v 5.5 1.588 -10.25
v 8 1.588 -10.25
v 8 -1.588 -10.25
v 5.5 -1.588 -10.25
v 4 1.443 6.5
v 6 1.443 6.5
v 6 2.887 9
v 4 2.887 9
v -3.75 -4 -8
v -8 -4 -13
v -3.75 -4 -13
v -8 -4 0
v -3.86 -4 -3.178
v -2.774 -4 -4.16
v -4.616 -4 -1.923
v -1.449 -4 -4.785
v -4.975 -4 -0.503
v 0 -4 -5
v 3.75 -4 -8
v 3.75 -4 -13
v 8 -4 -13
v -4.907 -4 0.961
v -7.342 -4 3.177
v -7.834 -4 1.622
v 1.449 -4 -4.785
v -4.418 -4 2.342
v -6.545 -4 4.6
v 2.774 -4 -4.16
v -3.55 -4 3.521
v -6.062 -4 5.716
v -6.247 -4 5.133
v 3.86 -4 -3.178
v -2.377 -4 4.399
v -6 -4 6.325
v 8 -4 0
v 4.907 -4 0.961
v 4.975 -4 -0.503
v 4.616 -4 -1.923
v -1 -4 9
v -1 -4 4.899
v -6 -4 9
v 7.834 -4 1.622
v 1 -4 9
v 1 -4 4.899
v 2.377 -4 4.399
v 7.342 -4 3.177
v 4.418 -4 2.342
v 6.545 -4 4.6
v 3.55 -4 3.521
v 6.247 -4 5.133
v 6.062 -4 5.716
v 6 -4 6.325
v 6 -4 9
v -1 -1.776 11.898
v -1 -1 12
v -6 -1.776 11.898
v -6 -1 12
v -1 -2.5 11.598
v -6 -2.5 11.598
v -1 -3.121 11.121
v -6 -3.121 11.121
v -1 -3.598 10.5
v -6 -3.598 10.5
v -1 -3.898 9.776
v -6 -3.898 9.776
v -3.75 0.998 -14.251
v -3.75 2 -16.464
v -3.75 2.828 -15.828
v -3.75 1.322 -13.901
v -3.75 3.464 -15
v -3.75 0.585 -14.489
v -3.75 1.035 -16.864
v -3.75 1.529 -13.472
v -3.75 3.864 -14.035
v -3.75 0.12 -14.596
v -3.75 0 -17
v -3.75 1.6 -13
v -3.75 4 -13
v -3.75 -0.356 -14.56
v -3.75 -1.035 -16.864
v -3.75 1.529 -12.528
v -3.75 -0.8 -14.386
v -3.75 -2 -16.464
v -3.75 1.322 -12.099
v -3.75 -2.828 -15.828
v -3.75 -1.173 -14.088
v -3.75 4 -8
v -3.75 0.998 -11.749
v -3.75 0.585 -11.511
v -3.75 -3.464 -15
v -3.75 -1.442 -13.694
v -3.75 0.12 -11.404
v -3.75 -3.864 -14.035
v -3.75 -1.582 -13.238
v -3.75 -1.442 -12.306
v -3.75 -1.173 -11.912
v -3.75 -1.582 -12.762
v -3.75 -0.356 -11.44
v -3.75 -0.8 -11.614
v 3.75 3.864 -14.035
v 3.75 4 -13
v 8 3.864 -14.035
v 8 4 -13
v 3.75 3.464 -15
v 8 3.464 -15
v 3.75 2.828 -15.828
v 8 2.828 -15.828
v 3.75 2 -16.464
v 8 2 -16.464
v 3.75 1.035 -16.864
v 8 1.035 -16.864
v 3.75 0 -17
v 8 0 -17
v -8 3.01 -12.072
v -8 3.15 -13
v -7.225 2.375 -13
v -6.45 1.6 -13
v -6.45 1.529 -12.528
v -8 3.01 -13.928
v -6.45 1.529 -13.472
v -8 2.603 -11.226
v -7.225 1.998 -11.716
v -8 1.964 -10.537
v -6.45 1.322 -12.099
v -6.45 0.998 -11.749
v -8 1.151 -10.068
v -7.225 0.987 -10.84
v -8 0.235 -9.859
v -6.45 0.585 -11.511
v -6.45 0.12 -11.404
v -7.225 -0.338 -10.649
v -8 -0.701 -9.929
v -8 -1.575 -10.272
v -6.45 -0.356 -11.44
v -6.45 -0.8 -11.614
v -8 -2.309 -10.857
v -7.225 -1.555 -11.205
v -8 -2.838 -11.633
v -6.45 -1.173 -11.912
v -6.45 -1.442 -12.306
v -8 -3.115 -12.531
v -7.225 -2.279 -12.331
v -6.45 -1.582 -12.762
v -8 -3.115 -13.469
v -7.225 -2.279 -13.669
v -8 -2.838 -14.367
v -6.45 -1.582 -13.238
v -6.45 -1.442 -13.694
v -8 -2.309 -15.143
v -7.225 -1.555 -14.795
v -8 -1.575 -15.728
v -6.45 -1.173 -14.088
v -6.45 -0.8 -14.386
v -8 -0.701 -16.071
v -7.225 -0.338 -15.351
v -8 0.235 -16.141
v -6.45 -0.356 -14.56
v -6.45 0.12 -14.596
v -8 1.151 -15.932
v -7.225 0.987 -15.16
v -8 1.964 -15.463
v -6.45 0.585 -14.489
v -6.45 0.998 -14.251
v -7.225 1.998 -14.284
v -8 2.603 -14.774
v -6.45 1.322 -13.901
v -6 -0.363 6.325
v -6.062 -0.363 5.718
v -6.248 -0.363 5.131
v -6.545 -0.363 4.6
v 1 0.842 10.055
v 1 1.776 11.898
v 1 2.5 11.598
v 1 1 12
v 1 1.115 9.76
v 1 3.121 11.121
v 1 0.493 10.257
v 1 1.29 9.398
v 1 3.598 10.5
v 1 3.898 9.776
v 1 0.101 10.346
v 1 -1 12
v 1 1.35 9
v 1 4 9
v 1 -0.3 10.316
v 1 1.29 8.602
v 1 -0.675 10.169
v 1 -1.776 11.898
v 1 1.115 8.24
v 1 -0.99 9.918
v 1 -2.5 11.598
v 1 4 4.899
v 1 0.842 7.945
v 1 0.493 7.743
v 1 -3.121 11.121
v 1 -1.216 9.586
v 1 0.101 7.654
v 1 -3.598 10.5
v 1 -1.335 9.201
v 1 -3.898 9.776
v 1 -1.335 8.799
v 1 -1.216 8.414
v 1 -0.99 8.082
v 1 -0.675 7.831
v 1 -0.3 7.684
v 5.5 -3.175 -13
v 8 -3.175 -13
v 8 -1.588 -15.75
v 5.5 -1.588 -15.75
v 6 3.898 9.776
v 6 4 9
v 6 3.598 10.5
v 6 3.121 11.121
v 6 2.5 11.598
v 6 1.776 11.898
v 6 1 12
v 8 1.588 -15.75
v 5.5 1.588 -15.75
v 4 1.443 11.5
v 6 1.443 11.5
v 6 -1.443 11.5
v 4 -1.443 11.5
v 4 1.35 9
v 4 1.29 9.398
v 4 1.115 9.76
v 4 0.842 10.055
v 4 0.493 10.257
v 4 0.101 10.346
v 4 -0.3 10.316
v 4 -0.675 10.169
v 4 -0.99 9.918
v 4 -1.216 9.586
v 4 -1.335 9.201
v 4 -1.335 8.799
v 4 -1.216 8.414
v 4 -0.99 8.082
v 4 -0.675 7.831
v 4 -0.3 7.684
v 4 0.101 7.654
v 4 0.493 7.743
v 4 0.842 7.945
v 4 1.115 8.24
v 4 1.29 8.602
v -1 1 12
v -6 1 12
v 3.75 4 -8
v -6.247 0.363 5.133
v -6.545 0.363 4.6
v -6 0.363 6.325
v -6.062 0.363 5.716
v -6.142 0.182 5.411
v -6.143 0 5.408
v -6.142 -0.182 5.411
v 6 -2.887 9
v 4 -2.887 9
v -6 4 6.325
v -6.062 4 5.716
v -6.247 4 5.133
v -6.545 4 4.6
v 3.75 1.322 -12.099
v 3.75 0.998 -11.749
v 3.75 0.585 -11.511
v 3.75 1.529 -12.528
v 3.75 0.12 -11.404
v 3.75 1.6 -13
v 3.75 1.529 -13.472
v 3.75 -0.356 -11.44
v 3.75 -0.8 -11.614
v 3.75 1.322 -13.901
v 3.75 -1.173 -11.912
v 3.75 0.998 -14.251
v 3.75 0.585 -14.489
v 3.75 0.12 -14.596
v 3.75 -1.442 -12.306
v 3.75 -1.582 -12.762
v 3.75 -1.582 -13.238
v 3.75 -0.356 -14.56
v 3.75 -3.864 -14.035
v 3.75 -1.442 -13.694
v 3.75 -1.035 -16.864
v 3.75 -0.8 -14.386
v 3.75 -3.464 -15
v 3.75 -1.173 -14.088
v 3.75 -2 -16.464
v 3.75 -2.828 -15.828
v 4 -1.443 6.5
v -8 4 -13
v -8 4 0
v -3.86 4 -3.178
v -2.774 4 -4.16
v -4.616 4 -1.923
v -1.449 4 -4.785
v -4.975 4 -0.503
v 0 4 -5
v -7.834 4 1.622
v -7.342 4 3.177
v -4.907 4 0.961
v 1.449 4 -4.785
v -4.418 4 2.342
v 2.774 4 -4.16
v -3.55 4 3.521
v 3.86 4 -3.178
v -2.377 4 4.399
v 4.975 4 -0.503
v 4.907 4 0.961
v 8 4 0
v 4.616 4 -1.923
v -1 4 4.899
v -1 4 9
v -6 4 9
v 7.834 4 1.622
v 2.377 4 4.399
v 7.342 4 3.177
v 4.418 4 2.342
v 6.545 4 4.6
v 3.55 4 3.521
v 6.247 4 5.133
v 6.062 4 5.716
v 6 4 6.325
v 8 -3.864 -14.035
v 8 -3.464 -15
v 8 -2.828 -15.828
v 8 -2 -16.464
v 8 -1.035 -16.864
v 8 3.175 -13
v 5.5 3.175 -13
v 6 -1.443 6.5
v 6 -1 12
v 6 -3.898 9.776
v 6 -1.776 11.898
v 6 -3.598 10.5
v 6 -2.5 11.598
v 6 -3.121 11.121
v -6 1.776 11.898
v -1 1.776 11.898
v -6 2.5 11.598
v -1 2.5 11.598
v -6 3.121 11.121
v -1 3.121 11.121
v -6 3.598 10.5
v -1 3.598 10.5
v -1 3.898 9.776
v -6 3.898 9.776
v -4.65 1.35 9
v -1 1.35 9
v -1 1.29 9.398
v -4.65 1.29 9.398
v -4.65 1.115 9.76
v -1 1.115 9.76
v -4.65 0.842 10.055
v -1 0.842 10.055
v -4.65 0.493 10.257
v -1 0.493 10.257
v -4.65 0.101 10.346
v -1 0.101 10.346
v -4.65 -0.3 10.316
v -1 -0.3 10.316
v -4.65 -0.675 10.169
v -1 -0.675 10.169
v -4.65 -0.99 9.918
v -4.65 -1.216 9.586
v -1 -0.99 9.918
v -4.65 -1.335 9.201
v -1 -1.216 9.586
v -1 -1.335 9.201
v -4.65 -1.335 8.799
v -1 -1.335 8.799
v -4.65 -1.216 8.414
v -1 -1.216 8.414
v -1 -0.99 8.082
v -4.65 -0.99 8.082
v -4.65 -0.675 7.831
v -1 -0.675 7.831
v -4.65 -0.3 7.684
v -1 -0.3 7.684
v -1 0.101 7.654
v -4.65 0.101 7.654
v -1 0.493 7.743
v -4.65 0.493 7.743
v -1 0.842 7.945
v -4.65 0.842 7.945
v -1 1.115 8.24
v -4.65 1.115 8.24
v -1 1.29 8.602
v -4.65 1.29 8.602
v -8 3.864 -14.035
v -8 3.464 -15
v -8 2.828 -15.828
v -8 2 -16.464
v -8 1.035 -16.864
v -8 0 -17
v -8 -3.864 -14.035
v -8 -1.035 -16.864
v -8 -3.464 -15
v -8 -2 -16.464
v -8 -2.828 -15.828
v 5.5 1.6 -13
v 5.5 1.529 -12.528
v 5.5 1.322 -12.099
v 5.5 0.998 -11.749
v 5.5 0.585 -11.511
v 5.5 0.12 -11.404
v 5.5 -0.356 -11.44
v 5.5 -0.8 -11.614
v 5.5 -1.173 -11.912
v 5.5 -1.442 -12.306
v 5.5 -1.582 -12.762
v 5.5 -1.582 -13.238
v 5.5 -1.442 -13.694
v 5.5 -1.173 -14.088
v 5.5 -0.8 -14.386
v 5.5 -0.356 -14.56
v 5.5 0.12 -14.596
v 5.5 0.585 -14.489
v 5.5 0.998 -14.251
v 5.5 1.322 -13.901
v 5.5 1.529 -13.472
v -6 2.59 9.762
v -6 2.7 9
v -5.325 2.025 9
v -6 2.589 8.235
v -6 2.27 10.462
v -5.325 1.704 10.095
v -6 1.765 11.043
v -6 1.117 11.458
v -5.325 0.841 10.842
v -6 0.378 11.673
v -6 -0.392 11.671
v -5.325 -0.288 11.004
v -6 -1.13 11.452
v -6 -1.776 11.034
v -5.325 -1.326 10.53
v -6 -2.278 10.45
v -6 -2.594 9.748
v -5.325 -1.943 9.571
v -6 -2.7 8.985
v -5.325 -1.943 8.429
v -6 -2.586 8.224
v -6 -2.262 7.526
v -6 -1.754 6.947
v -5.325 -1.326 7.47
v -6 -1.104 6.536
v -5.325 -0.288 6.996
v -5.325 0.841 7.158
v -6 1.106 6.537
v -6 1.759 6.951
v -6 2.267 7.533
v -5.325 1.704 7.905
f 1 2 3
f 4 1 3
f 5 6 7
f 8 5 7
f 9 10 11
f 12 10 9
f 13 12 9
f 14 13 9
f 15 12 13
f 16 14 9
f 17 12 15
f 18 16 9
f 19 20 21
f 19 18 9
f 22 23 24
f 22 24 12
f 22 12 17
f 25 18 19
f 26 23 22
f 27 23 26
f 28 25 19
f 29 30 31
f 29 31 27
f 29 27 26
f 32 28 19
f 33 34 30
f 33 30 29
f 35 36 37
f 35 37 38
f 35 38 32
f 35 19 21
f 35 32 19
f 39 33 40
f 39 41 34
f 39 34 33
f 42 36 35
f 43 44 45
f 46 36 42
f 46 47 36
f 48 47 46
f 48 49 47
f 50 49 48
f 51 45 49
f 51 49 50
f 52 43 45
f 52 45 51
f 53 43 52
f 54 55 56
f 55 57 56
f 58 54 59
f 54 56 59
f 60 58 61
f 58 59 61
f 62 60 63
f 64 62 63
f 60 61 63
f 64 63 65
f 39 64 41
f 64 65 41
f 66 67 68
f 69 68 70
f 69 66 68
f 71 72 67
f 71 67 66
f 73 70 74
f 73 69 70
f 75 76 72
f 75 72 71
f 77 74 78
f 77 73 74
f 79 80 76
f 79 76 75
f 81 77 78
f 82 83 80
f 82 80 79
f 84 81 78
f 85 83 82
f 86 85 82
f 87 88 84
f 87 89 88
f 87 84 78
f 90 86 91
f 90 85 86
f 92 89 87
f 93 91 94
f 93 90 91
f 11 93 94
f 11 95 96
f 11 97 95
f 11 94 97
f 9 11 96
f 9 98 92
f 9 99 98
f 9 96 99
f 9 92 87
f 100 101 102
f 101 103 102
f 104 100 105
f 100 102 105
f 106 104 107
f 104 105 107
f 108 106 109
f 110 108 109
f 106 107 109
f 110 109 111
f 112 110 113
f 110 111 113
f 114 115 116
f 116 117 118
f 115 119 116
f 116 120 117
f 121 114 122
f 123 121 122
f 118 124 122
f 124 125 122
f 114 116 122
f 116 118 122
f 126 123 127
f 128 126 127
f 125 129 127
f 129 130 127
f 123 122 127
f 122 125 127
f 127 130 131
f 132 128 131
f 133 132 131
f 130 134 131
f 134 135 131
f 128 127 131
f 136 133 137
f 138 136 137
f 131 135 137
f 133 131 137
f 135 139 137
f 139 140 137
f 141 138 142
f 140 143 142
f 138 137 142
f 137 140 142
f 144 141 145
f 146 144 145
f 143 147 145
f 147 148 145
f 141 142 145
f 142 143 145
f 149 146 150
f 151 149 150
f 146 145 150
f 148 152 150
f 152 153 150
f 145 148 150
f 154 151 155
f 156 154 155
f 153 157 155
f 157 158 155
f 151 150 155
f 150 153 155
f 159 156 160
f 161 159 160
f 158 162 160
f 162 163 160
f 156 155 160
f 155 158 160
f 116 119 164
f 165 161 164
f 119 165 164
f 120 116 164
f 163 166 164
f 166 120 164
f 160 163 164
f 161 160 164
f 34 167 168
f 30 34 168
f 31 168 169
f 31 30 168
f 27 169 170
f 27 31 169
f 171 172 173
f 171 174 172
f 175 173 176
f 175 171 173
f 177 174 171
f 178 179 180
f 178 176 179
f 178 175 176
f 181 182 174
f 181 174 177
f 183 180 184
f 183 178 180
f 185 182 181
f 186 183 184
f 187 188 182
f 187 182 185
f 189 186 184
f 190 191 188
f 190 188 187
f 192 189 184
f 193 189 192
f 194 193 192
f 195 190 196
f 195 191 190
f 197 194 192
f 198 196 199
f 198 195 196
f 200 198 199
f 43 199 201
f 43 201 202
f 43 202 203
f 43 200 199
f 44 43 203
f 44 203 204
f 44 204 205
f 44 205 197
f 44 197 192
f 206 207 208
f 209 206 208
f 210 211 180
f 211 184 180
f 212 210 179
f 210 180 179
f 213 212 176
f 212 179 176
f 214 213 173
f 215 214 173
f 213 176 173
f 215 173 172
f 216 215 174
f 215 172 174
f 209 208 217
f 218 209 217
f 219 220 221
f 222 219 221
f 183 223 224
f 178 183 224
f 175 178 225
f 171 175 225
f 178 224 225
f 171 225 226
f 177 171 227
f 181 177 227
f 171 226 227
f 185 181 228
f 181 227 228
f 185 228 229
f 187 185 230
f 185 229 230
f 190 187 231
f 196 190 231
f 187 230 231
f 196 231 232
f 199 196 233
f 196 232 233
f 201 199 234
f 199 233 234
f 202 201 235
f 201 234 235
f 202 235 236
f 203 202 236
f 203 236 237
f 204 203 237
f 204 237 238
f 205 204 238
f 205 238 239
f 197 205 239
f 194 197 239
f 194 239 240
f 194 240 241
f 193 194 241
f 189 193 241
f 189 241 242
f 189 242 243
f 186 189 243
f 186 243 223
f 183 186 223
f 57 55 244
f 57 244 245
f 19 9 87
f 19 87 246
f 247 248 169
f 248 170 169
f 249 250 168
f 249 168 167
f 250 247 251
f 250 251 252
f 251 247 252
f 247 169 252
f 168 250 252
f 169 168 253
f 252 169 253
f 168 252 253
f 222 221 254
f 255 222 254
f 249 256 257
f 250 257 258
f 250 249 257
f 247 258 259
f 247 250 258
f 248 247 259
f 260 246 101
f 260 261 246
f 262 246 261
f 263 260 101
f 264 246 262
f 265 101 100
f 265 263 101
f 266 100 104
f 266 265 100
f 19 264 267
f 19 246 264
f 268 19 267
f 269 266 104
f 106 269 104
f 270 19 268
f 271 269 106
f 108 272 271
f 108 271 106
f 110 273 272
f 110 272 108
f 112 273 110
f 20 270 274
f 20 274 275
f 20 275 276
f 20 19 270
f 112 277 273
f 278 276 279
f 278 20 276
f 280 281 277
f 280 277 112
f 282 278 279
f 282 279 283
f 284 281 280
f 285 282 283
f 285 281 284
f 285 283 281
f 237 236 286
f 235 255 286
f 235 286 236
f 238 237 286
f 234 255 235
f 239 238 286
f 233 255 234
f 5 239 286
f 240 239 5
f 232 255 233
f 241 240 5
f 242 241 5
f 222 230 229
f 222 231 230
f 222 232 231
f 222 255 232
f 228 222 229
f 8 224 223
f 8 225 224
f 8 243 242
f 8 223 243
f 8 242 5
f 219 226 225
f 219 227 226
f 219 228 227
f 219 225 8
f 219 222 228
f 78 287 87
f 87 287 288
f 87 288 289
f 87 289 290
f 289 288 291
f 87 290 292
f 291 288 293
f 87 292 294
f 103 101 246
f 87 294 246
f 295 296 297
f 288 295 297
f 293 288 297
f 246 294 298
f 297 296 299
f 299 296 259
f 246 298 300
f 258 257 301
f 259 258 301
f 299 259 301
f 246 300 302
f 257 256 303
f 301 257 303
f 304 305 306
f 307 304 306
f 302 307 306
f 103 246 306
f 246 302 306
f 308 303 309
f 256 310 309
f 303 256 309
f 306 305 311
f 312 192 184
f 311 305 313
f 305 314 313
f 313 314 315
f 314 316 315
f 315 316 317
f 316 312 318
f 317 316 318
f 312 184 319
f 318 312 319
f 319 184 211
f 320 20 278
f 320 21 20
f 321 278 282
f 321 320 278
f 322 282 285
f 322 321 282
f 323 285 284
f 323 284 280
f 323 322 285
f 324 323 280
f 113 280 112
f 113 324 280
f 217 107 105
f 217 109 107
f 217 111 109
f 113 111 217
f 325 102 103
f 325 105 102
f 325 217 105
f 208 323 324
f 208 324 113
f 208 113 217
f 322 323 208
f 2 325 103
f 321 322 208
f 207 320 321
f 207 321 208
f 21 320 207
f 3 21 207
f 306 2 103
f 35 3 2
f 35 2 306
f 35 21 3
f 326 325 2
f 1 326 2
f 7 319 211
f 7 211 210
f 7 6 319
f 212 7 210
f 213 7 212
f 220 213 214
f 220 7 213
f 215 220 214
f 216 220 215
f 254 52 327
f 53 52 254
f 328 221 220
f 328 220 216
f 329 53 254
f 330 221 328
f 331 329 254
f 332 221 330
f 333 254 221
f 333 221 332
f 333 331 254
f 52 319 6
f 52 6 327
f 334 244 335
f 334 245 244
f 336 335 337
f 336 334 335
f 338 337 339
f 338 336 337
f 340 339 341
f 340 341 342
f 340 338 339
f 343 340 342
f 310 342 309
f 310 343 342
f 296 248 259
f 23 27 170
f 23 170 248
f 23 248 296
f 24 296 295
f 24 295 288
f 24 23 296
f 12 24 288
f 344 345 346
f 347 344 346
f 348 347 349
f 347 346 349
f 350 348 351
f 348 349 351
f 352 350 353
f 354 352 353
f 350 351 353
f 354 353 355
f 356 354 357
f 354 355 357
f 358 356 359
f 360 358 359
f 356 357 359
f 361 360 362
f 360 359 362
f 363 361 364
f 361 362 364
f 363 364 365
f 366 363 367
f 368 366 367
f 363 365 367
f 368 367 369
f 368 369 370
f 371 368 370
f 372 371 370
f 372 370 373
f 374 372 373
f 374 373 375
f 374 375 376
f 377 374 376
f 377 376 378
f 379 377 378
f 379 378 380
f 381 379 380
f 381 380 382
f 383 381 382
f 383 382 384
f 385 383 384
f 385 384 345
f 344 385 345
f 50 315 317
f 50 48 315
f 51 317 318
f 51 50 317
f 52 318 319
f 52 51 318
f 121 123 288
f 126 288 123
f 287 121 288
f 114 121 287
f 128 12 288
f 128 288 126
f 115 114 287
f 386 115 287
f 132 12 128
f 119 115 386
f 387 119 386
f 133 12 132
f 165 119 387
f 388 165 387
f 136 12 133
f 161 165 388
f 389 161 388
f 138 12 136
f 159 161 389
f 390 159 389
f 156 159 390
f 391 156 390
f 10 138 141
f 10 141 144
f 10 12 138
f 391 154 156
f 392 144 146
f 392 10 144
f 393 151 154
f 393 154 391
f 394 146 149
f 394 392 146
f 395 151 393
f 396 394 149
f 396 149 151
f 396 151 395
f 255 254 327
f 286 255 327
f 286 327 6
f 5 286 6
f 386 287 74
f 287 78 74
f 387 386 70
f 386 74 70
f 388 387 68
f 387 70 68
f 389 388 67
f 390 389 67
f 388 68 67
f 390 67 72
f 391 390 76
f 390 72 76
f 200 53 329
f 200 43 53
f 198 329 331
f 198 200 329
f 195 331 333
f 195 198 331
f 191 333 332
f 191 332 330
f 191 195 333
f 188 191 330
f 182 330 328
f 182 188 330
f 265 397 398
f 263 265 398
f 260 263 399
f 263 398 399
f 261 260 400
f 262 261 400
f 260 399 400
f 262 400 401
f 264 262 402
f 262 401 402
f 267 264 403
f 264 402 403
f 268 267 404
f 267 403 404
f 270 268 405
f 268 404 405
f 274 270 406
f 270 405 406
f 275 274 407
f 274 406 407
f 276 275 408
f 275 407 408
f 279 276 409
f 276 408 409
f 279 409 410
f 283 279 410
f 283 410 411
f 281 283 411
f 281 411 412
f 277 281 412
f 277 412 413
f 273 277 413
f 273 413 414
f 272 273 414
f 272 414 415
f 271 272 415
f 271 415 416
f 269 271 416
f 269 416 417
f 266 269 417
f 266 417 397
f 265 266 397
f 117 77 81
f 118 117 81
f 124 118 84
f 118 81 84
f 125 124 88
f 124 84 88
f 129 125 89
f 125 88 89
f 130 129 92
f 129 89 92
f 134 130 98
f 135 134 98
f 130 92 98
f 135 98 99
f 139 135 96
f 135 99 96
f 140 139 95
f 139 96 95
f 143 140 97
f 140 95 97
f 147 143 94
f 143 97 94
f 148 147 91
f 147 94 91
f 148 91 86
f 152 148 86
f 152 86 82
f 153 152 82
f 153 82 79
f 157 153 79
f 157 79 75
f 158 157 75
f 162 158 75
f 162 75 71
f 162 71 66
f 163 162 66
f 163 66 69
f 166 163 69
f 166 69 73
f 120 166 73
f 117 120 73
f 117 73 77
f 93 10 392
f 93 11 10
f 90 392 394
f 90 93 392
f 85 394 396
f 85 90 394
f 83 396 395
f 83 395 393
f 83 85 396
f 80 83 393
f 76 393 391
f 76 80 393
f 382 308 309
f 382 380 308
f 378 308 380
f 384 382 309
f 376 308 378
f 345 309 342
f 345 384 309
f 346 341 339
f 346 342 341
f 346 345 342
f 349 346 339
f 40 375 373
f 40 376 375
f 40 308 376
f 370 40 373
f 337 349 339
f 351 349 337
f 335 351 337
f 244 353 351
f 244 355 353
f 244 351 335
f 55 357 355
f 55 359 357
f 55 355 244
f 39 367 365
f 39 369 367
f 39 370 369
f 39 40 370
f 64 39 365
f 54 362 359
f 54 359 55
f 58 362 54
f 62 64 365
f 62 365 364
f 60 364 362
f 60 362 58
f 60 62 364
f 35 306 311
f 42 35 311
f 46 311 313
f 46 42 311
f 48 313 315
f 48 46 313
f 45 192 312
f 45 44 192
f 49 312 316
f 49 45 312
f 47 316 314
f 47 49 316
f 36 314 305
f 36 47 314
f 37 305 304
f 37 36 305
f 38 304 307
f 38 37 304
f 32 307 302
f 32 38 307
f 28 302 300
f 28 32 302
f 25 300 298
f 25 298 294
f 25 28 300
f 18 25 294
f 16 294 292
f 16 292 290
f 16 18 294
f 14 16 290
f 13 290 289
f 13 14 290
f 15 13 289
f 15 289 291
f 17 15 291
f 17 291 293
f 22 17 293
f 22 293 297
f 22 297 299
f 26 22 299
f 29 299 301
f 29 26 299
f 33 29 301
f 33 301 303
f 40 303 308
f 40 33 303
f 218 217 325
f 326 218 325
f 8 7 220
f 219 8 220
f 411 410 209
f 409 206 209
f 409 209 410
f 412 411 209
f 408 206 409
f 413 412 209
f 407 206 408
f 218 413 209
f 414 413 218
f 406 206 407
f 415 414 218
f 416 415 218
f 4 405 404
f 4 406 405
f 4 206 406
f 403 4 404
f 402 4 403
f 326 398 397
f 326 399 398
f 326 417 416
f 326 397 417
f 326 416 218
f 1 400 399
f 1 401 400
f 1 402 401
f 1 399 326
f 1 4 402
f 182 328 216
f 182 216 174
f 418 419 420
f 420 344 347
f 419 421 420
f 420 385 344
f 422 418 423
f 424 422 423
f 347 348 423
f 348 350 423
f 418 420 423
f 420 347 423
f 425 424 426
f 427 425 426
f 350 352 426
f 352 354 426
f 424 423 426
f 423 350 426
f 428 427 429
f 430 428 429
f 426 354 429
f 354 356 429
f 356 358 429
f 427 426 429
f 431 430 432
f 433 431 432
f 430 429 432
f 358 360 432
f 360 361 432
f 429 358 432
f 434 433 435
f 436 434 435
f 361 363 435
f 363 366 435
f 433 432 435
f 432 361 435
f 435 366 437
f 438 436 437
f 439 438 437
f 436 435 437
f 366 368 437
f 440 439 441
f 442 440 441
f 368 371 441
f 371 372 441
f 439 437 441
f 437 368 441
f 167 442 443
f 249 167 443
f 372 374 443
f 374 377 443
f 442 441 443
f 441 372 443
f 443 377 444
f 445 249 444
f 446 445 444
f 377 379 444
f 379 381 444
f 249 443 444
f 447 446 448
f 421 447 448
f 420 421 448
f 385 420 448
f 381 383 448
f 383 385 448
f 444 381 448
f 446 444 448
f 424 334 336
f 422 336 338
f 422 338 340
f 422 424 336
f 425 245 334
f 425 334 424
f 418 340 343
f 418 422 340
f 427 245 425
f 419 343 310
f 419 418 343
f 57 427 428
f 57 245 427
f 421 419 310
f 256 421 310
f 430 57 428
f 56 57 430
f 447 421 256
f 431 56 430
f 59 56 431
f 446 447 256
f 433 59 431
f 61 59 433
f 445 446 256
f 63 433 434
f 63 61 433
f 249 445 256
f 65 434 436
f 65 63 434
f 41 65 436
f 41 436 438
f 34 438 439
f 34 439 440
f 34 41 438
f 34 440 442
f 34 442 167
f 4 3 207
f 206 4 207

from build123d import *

# Parameters (mm, degrees)
F1_DEPTH = 4
F2_R     = 1.35
F3_DEPTH = 14.001
F4_DEPTH = 2
F5_R     = 1.6
F6_DEPTH = 25
F7_DEPTH = 2.5
F8_SIZE  = 1.35
F9_R     = 3
F10_R    = 3.99999
F11_SIZE = 1.55


# Not quite as in the source:
# - a fillet or chamfer is up to 0.001 mm smaller than in the source, because OpenCascade refuses the exact size
# - a feature names something its author has since deleted; it is built from what else it names


with BuildPart() as f1:
    # F0 (on Front) → F1 (new body, symmetric)
    with BuildSketch(Plane.XZ):
        with BuildLine():
            ThreePointArc((1, 4.8989794856), (0, -5), (-1, 4.8989794856))
            Line((-1, 4.8989794856), (-1, 12))
            Line((-1, 12), (-6, 12))
            Line((-6, 12), (-6, 5.2915026221))
            ThreePointArc((-6, 5.2915026221), (-7.4833147735, 2.8284271247), (-8, 0))
            Line((-8, 0), (-8, -17))
            Line((-8, -17), (-3.75, -17))
            Line((-3.75, -17), (-3.75, -8))
            Line((-3.75, -8), (3.75, -8))
            Line((3.75, -8), (3.75, -17))
            Line((3.75, -17), (8, -17))
            Line((8, -17), (8, 0))
            ThreePointArc((8, 0), (7.4833147735, 2.8284271247), (6, 5.2915026221))
            Line((6, 5.2915026221), (6, 12))
            Line((6, 12), (1, 12))
            Line((1, 12), (1, 4.8989794856))
        make_face()
    extrude(amount=F1_DEPTH, both=True)

    # F2 (on face) → F3 (cut, through all)
    with BuildSketch(Plane.YZ.offset(6)):
        with Locations((0, 9)):
            Circle(F2_R)
    extrude(amount=-F3_DEPTH, mode=Mode.SUBTRACT)

    # F2 (on face) → F4 (cut)
    with BuildSketch(Plane.YZ.offset(6)):
        Polygon((2.8867513459, 9), (1.443375673, 11.5), (-1.443375673, 11.5), (-2.8867513459, 9), (-1.443375673, 6.5), (1.443375673, 6.5), align=None)
        with Locations((0, 9)):
            Circle(F2_R, mode=Mode.SUBTRACT)
    extrude(amount=-F4_DEPTH, mode=Mode.SUBTRACT)

    # F5 (on face) → F6 (cut)
    with BuildSketch(Plane.YZ.offset(8)):
        with Locations((0, -13)):
            Circle(F5_R)
    extrude(amount=-F6_DEPTH, mode=Mode.SUBTRACT)

    # F5 (on face) → F7 (cut)
    with BuildSketch(Plane.YZ.offset(8)):
        Polygon((1.5877132403, -10.25), (-1.5877132403, -10.25), (-3.1754264805, -13), (-1.5877132403, -15.75), (1.5877132403, -15.75), (3.1754264805, -13), align=None)
        with Locations((0, -13)):
            Circle(F5_R, mode=Mode.SUBTRACT)
    extrude(amount=-F7_DEPTH, mode=Mode.SUBTRACT)

    # F8
    f8_edges = [f1.edges().sort_by_distance(p)[0] for p in [
        (-6, -1.35, 9),
    ]]
    chamfer(f8_edges, length=F8_SIZE)

    # F9
    f9_edges = [f1.edges().sort_by_distance(p)[0] for p in [
        (-3.5, -4, 12),
        (3.5, -4, 12),
        (3.5, 4, 12),
        (-3.5, 4, 12),
        (6, 0, 5.291503),
        (-6, 0, 5.291503),
    ]]
    fillet(f9_edges, radius=F9_R)

    # F10 (radius 4 in the source; OpenCascade refuses exactly that, so slightly less here)
    f10_edges = [f1.edges().sort_by_distance(p)[0] for p in [
        (5.875, -4, -17),
        (-5.875, -4, -17),
        (-5.875, 4, -17),
        (5.875, 4, -17),
    ]]
    fillet(f10_edges, radius=F10_R)

    # F11
    f11_edges = [f1.edges().sort_by_distance(p)[0] for p in [
        (-8, -1.6, -13),
    ]]
    chamfer(f11_edges, length=F11_SIZE)


solid = f1.part
